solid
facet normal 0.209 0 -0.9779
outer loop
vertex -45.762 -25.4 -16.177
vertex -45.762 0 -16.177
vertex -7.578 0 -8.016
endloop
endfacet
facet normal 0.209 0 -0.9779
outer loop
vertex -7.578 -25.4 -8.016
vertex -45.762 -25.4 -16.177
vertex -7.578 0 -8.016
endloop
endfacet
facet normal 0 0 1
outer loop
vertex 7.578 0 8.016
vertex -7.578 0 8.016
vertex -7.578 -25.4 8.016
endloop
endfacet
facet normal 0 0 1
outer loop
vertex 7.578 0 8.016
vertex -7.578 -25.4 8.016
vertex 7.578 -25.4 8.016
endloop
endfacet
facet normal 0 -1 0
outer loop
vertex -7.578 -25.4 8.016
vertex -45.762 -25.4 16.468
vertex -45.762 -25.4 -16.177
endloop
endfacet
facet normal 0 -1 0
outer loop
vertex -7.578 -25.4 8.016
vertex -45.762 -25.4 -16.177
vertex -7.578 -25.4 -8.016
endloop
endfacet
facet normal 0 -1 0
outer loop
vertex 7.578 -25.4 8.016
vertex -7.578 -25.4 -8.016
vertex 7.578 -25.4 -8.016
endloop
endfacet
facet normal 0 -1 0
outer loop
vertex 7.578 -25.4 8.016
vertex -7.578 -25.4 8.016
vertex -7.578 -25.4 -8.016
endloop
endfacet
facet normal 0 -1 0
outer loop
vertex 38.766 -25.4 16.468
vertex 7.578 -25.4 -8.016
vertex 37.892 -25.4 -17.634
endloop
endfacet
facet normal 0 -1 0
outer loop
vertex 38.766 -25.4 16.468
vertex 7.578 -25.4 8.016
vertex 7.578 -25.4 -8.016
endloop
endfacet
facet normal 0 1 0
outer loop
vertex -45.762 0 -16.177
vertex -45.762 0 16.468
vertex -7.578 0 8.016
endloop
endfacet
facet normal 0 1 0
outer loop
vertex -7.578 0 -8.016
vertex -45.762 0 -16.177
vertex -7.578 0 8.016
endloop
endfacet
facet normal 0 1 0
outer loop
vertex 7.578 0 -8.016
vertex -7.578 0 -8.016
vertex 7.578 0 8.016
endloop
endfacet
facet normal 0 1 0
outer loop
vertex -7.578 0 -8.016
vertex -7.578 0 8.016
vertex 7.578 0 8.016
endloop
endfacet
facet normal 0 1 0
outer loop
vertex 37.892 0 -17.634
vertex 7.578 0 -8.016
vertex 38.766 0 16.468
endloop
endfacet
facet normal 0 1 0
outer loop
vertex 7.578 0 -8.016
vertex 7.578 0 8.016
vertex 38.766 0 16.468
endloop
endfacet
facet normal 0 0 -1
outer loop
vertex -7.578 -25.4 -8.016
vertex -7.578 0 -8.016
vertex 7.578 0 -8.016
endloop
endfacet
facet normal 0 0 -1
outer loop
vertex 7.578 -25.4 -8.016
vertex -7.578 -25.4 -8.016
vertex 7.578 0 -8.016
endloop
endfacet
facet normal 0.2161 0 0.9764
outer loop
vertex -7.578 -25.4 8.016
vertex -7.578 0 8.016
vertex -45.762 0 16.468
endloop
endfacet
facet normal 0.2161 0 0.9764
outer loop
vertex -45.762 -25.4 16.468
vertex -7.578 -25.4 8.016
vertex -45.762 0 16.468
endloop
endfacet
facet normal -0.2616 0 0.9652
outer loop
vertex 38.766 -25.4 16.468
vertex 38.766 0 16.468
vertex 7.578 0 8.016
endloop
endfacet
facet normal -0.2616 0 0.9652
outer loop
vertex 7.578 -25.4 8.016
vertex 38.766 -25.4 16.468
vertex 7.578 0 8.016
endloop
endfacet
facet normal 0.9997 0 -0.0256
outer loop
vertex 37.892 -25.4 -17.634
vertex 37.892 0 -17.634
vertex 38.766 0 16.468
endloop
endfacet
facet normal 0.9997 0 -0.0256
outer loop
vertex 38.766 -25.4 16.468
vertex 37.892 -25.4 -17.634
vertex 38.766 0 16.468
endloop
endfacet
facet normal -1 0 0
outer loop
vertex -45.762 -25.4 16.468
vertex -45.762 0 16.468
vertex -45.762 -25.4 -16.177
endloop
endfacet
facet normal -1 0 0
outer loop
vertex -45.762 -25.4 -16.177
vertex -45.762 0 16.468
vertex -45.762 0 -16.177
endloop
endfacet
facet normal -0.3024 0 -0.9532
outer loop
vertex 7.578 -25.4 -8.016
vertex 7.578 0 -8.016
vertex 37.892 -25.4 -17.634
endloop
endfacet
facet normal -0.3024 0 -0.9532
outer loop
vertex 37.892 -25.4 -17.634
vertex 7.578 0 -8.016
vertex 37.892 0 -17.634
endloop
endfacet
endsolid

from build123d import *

# Parameters (mm, degrees)
F0_W     = 15.156722
F0_H     = 16.031148
F1_DEPTH = 25.4
F2_DEPTH = 25.4
F3_DEPTH = 25.4


with BuildPart() as f1:
    # F0 (on Front) → F1 (new body)
    with BuildSketch(Plane.XZ):
        Rectangle(F0_W, F0_H)
        Polygon((7.578361, 8.015574), (7.578361, -8.015574), (37.891805, -17.634263), (38.766231, 16.468361), align=None)
        Polygon((-45.761641, -16.176885), (-7.578361, -8.015574), (-7.578361, 8.015574), (-45.761641, 16.468361), align=None)
    extrude(amount=F1_DEPTH)

    # F0 (on Front) → F2 (join)
    with BuildSketch(Plane.XZ):
        Rectangle(F0_W, F0_H)
        Polygon((7.578361, 8.015574), (7.578361, -8.015574), (37.891805, -17.634263), (38.766231, 16.468361), align=None)
        Polygon((-45.761641, -16.176885), (-7.578361, -8.015574), (-7.578361, 8.015574), (-45.761641, 16.468361), align=None)
    extrude(amount=F2_DEPTH)

    # F0 (on Front) → F3 (join)
    with BuildSketch(Plane.XZ):
        Rectangle(F0_W, F0_H)
        Polygon((7.578361, 8.015574), (7.578361, -8.015574), (37.891805, -17.634263), (38.766231, 16.468361), align=None)
        Polygon((-45.761641, -16.176885), (-7.578361, -8.015574), (-7.578361, 8.015574), (-45.761641, 16.468361), align=None)
    extrude(amount=F3_DEPTH)


solid = f1.part
